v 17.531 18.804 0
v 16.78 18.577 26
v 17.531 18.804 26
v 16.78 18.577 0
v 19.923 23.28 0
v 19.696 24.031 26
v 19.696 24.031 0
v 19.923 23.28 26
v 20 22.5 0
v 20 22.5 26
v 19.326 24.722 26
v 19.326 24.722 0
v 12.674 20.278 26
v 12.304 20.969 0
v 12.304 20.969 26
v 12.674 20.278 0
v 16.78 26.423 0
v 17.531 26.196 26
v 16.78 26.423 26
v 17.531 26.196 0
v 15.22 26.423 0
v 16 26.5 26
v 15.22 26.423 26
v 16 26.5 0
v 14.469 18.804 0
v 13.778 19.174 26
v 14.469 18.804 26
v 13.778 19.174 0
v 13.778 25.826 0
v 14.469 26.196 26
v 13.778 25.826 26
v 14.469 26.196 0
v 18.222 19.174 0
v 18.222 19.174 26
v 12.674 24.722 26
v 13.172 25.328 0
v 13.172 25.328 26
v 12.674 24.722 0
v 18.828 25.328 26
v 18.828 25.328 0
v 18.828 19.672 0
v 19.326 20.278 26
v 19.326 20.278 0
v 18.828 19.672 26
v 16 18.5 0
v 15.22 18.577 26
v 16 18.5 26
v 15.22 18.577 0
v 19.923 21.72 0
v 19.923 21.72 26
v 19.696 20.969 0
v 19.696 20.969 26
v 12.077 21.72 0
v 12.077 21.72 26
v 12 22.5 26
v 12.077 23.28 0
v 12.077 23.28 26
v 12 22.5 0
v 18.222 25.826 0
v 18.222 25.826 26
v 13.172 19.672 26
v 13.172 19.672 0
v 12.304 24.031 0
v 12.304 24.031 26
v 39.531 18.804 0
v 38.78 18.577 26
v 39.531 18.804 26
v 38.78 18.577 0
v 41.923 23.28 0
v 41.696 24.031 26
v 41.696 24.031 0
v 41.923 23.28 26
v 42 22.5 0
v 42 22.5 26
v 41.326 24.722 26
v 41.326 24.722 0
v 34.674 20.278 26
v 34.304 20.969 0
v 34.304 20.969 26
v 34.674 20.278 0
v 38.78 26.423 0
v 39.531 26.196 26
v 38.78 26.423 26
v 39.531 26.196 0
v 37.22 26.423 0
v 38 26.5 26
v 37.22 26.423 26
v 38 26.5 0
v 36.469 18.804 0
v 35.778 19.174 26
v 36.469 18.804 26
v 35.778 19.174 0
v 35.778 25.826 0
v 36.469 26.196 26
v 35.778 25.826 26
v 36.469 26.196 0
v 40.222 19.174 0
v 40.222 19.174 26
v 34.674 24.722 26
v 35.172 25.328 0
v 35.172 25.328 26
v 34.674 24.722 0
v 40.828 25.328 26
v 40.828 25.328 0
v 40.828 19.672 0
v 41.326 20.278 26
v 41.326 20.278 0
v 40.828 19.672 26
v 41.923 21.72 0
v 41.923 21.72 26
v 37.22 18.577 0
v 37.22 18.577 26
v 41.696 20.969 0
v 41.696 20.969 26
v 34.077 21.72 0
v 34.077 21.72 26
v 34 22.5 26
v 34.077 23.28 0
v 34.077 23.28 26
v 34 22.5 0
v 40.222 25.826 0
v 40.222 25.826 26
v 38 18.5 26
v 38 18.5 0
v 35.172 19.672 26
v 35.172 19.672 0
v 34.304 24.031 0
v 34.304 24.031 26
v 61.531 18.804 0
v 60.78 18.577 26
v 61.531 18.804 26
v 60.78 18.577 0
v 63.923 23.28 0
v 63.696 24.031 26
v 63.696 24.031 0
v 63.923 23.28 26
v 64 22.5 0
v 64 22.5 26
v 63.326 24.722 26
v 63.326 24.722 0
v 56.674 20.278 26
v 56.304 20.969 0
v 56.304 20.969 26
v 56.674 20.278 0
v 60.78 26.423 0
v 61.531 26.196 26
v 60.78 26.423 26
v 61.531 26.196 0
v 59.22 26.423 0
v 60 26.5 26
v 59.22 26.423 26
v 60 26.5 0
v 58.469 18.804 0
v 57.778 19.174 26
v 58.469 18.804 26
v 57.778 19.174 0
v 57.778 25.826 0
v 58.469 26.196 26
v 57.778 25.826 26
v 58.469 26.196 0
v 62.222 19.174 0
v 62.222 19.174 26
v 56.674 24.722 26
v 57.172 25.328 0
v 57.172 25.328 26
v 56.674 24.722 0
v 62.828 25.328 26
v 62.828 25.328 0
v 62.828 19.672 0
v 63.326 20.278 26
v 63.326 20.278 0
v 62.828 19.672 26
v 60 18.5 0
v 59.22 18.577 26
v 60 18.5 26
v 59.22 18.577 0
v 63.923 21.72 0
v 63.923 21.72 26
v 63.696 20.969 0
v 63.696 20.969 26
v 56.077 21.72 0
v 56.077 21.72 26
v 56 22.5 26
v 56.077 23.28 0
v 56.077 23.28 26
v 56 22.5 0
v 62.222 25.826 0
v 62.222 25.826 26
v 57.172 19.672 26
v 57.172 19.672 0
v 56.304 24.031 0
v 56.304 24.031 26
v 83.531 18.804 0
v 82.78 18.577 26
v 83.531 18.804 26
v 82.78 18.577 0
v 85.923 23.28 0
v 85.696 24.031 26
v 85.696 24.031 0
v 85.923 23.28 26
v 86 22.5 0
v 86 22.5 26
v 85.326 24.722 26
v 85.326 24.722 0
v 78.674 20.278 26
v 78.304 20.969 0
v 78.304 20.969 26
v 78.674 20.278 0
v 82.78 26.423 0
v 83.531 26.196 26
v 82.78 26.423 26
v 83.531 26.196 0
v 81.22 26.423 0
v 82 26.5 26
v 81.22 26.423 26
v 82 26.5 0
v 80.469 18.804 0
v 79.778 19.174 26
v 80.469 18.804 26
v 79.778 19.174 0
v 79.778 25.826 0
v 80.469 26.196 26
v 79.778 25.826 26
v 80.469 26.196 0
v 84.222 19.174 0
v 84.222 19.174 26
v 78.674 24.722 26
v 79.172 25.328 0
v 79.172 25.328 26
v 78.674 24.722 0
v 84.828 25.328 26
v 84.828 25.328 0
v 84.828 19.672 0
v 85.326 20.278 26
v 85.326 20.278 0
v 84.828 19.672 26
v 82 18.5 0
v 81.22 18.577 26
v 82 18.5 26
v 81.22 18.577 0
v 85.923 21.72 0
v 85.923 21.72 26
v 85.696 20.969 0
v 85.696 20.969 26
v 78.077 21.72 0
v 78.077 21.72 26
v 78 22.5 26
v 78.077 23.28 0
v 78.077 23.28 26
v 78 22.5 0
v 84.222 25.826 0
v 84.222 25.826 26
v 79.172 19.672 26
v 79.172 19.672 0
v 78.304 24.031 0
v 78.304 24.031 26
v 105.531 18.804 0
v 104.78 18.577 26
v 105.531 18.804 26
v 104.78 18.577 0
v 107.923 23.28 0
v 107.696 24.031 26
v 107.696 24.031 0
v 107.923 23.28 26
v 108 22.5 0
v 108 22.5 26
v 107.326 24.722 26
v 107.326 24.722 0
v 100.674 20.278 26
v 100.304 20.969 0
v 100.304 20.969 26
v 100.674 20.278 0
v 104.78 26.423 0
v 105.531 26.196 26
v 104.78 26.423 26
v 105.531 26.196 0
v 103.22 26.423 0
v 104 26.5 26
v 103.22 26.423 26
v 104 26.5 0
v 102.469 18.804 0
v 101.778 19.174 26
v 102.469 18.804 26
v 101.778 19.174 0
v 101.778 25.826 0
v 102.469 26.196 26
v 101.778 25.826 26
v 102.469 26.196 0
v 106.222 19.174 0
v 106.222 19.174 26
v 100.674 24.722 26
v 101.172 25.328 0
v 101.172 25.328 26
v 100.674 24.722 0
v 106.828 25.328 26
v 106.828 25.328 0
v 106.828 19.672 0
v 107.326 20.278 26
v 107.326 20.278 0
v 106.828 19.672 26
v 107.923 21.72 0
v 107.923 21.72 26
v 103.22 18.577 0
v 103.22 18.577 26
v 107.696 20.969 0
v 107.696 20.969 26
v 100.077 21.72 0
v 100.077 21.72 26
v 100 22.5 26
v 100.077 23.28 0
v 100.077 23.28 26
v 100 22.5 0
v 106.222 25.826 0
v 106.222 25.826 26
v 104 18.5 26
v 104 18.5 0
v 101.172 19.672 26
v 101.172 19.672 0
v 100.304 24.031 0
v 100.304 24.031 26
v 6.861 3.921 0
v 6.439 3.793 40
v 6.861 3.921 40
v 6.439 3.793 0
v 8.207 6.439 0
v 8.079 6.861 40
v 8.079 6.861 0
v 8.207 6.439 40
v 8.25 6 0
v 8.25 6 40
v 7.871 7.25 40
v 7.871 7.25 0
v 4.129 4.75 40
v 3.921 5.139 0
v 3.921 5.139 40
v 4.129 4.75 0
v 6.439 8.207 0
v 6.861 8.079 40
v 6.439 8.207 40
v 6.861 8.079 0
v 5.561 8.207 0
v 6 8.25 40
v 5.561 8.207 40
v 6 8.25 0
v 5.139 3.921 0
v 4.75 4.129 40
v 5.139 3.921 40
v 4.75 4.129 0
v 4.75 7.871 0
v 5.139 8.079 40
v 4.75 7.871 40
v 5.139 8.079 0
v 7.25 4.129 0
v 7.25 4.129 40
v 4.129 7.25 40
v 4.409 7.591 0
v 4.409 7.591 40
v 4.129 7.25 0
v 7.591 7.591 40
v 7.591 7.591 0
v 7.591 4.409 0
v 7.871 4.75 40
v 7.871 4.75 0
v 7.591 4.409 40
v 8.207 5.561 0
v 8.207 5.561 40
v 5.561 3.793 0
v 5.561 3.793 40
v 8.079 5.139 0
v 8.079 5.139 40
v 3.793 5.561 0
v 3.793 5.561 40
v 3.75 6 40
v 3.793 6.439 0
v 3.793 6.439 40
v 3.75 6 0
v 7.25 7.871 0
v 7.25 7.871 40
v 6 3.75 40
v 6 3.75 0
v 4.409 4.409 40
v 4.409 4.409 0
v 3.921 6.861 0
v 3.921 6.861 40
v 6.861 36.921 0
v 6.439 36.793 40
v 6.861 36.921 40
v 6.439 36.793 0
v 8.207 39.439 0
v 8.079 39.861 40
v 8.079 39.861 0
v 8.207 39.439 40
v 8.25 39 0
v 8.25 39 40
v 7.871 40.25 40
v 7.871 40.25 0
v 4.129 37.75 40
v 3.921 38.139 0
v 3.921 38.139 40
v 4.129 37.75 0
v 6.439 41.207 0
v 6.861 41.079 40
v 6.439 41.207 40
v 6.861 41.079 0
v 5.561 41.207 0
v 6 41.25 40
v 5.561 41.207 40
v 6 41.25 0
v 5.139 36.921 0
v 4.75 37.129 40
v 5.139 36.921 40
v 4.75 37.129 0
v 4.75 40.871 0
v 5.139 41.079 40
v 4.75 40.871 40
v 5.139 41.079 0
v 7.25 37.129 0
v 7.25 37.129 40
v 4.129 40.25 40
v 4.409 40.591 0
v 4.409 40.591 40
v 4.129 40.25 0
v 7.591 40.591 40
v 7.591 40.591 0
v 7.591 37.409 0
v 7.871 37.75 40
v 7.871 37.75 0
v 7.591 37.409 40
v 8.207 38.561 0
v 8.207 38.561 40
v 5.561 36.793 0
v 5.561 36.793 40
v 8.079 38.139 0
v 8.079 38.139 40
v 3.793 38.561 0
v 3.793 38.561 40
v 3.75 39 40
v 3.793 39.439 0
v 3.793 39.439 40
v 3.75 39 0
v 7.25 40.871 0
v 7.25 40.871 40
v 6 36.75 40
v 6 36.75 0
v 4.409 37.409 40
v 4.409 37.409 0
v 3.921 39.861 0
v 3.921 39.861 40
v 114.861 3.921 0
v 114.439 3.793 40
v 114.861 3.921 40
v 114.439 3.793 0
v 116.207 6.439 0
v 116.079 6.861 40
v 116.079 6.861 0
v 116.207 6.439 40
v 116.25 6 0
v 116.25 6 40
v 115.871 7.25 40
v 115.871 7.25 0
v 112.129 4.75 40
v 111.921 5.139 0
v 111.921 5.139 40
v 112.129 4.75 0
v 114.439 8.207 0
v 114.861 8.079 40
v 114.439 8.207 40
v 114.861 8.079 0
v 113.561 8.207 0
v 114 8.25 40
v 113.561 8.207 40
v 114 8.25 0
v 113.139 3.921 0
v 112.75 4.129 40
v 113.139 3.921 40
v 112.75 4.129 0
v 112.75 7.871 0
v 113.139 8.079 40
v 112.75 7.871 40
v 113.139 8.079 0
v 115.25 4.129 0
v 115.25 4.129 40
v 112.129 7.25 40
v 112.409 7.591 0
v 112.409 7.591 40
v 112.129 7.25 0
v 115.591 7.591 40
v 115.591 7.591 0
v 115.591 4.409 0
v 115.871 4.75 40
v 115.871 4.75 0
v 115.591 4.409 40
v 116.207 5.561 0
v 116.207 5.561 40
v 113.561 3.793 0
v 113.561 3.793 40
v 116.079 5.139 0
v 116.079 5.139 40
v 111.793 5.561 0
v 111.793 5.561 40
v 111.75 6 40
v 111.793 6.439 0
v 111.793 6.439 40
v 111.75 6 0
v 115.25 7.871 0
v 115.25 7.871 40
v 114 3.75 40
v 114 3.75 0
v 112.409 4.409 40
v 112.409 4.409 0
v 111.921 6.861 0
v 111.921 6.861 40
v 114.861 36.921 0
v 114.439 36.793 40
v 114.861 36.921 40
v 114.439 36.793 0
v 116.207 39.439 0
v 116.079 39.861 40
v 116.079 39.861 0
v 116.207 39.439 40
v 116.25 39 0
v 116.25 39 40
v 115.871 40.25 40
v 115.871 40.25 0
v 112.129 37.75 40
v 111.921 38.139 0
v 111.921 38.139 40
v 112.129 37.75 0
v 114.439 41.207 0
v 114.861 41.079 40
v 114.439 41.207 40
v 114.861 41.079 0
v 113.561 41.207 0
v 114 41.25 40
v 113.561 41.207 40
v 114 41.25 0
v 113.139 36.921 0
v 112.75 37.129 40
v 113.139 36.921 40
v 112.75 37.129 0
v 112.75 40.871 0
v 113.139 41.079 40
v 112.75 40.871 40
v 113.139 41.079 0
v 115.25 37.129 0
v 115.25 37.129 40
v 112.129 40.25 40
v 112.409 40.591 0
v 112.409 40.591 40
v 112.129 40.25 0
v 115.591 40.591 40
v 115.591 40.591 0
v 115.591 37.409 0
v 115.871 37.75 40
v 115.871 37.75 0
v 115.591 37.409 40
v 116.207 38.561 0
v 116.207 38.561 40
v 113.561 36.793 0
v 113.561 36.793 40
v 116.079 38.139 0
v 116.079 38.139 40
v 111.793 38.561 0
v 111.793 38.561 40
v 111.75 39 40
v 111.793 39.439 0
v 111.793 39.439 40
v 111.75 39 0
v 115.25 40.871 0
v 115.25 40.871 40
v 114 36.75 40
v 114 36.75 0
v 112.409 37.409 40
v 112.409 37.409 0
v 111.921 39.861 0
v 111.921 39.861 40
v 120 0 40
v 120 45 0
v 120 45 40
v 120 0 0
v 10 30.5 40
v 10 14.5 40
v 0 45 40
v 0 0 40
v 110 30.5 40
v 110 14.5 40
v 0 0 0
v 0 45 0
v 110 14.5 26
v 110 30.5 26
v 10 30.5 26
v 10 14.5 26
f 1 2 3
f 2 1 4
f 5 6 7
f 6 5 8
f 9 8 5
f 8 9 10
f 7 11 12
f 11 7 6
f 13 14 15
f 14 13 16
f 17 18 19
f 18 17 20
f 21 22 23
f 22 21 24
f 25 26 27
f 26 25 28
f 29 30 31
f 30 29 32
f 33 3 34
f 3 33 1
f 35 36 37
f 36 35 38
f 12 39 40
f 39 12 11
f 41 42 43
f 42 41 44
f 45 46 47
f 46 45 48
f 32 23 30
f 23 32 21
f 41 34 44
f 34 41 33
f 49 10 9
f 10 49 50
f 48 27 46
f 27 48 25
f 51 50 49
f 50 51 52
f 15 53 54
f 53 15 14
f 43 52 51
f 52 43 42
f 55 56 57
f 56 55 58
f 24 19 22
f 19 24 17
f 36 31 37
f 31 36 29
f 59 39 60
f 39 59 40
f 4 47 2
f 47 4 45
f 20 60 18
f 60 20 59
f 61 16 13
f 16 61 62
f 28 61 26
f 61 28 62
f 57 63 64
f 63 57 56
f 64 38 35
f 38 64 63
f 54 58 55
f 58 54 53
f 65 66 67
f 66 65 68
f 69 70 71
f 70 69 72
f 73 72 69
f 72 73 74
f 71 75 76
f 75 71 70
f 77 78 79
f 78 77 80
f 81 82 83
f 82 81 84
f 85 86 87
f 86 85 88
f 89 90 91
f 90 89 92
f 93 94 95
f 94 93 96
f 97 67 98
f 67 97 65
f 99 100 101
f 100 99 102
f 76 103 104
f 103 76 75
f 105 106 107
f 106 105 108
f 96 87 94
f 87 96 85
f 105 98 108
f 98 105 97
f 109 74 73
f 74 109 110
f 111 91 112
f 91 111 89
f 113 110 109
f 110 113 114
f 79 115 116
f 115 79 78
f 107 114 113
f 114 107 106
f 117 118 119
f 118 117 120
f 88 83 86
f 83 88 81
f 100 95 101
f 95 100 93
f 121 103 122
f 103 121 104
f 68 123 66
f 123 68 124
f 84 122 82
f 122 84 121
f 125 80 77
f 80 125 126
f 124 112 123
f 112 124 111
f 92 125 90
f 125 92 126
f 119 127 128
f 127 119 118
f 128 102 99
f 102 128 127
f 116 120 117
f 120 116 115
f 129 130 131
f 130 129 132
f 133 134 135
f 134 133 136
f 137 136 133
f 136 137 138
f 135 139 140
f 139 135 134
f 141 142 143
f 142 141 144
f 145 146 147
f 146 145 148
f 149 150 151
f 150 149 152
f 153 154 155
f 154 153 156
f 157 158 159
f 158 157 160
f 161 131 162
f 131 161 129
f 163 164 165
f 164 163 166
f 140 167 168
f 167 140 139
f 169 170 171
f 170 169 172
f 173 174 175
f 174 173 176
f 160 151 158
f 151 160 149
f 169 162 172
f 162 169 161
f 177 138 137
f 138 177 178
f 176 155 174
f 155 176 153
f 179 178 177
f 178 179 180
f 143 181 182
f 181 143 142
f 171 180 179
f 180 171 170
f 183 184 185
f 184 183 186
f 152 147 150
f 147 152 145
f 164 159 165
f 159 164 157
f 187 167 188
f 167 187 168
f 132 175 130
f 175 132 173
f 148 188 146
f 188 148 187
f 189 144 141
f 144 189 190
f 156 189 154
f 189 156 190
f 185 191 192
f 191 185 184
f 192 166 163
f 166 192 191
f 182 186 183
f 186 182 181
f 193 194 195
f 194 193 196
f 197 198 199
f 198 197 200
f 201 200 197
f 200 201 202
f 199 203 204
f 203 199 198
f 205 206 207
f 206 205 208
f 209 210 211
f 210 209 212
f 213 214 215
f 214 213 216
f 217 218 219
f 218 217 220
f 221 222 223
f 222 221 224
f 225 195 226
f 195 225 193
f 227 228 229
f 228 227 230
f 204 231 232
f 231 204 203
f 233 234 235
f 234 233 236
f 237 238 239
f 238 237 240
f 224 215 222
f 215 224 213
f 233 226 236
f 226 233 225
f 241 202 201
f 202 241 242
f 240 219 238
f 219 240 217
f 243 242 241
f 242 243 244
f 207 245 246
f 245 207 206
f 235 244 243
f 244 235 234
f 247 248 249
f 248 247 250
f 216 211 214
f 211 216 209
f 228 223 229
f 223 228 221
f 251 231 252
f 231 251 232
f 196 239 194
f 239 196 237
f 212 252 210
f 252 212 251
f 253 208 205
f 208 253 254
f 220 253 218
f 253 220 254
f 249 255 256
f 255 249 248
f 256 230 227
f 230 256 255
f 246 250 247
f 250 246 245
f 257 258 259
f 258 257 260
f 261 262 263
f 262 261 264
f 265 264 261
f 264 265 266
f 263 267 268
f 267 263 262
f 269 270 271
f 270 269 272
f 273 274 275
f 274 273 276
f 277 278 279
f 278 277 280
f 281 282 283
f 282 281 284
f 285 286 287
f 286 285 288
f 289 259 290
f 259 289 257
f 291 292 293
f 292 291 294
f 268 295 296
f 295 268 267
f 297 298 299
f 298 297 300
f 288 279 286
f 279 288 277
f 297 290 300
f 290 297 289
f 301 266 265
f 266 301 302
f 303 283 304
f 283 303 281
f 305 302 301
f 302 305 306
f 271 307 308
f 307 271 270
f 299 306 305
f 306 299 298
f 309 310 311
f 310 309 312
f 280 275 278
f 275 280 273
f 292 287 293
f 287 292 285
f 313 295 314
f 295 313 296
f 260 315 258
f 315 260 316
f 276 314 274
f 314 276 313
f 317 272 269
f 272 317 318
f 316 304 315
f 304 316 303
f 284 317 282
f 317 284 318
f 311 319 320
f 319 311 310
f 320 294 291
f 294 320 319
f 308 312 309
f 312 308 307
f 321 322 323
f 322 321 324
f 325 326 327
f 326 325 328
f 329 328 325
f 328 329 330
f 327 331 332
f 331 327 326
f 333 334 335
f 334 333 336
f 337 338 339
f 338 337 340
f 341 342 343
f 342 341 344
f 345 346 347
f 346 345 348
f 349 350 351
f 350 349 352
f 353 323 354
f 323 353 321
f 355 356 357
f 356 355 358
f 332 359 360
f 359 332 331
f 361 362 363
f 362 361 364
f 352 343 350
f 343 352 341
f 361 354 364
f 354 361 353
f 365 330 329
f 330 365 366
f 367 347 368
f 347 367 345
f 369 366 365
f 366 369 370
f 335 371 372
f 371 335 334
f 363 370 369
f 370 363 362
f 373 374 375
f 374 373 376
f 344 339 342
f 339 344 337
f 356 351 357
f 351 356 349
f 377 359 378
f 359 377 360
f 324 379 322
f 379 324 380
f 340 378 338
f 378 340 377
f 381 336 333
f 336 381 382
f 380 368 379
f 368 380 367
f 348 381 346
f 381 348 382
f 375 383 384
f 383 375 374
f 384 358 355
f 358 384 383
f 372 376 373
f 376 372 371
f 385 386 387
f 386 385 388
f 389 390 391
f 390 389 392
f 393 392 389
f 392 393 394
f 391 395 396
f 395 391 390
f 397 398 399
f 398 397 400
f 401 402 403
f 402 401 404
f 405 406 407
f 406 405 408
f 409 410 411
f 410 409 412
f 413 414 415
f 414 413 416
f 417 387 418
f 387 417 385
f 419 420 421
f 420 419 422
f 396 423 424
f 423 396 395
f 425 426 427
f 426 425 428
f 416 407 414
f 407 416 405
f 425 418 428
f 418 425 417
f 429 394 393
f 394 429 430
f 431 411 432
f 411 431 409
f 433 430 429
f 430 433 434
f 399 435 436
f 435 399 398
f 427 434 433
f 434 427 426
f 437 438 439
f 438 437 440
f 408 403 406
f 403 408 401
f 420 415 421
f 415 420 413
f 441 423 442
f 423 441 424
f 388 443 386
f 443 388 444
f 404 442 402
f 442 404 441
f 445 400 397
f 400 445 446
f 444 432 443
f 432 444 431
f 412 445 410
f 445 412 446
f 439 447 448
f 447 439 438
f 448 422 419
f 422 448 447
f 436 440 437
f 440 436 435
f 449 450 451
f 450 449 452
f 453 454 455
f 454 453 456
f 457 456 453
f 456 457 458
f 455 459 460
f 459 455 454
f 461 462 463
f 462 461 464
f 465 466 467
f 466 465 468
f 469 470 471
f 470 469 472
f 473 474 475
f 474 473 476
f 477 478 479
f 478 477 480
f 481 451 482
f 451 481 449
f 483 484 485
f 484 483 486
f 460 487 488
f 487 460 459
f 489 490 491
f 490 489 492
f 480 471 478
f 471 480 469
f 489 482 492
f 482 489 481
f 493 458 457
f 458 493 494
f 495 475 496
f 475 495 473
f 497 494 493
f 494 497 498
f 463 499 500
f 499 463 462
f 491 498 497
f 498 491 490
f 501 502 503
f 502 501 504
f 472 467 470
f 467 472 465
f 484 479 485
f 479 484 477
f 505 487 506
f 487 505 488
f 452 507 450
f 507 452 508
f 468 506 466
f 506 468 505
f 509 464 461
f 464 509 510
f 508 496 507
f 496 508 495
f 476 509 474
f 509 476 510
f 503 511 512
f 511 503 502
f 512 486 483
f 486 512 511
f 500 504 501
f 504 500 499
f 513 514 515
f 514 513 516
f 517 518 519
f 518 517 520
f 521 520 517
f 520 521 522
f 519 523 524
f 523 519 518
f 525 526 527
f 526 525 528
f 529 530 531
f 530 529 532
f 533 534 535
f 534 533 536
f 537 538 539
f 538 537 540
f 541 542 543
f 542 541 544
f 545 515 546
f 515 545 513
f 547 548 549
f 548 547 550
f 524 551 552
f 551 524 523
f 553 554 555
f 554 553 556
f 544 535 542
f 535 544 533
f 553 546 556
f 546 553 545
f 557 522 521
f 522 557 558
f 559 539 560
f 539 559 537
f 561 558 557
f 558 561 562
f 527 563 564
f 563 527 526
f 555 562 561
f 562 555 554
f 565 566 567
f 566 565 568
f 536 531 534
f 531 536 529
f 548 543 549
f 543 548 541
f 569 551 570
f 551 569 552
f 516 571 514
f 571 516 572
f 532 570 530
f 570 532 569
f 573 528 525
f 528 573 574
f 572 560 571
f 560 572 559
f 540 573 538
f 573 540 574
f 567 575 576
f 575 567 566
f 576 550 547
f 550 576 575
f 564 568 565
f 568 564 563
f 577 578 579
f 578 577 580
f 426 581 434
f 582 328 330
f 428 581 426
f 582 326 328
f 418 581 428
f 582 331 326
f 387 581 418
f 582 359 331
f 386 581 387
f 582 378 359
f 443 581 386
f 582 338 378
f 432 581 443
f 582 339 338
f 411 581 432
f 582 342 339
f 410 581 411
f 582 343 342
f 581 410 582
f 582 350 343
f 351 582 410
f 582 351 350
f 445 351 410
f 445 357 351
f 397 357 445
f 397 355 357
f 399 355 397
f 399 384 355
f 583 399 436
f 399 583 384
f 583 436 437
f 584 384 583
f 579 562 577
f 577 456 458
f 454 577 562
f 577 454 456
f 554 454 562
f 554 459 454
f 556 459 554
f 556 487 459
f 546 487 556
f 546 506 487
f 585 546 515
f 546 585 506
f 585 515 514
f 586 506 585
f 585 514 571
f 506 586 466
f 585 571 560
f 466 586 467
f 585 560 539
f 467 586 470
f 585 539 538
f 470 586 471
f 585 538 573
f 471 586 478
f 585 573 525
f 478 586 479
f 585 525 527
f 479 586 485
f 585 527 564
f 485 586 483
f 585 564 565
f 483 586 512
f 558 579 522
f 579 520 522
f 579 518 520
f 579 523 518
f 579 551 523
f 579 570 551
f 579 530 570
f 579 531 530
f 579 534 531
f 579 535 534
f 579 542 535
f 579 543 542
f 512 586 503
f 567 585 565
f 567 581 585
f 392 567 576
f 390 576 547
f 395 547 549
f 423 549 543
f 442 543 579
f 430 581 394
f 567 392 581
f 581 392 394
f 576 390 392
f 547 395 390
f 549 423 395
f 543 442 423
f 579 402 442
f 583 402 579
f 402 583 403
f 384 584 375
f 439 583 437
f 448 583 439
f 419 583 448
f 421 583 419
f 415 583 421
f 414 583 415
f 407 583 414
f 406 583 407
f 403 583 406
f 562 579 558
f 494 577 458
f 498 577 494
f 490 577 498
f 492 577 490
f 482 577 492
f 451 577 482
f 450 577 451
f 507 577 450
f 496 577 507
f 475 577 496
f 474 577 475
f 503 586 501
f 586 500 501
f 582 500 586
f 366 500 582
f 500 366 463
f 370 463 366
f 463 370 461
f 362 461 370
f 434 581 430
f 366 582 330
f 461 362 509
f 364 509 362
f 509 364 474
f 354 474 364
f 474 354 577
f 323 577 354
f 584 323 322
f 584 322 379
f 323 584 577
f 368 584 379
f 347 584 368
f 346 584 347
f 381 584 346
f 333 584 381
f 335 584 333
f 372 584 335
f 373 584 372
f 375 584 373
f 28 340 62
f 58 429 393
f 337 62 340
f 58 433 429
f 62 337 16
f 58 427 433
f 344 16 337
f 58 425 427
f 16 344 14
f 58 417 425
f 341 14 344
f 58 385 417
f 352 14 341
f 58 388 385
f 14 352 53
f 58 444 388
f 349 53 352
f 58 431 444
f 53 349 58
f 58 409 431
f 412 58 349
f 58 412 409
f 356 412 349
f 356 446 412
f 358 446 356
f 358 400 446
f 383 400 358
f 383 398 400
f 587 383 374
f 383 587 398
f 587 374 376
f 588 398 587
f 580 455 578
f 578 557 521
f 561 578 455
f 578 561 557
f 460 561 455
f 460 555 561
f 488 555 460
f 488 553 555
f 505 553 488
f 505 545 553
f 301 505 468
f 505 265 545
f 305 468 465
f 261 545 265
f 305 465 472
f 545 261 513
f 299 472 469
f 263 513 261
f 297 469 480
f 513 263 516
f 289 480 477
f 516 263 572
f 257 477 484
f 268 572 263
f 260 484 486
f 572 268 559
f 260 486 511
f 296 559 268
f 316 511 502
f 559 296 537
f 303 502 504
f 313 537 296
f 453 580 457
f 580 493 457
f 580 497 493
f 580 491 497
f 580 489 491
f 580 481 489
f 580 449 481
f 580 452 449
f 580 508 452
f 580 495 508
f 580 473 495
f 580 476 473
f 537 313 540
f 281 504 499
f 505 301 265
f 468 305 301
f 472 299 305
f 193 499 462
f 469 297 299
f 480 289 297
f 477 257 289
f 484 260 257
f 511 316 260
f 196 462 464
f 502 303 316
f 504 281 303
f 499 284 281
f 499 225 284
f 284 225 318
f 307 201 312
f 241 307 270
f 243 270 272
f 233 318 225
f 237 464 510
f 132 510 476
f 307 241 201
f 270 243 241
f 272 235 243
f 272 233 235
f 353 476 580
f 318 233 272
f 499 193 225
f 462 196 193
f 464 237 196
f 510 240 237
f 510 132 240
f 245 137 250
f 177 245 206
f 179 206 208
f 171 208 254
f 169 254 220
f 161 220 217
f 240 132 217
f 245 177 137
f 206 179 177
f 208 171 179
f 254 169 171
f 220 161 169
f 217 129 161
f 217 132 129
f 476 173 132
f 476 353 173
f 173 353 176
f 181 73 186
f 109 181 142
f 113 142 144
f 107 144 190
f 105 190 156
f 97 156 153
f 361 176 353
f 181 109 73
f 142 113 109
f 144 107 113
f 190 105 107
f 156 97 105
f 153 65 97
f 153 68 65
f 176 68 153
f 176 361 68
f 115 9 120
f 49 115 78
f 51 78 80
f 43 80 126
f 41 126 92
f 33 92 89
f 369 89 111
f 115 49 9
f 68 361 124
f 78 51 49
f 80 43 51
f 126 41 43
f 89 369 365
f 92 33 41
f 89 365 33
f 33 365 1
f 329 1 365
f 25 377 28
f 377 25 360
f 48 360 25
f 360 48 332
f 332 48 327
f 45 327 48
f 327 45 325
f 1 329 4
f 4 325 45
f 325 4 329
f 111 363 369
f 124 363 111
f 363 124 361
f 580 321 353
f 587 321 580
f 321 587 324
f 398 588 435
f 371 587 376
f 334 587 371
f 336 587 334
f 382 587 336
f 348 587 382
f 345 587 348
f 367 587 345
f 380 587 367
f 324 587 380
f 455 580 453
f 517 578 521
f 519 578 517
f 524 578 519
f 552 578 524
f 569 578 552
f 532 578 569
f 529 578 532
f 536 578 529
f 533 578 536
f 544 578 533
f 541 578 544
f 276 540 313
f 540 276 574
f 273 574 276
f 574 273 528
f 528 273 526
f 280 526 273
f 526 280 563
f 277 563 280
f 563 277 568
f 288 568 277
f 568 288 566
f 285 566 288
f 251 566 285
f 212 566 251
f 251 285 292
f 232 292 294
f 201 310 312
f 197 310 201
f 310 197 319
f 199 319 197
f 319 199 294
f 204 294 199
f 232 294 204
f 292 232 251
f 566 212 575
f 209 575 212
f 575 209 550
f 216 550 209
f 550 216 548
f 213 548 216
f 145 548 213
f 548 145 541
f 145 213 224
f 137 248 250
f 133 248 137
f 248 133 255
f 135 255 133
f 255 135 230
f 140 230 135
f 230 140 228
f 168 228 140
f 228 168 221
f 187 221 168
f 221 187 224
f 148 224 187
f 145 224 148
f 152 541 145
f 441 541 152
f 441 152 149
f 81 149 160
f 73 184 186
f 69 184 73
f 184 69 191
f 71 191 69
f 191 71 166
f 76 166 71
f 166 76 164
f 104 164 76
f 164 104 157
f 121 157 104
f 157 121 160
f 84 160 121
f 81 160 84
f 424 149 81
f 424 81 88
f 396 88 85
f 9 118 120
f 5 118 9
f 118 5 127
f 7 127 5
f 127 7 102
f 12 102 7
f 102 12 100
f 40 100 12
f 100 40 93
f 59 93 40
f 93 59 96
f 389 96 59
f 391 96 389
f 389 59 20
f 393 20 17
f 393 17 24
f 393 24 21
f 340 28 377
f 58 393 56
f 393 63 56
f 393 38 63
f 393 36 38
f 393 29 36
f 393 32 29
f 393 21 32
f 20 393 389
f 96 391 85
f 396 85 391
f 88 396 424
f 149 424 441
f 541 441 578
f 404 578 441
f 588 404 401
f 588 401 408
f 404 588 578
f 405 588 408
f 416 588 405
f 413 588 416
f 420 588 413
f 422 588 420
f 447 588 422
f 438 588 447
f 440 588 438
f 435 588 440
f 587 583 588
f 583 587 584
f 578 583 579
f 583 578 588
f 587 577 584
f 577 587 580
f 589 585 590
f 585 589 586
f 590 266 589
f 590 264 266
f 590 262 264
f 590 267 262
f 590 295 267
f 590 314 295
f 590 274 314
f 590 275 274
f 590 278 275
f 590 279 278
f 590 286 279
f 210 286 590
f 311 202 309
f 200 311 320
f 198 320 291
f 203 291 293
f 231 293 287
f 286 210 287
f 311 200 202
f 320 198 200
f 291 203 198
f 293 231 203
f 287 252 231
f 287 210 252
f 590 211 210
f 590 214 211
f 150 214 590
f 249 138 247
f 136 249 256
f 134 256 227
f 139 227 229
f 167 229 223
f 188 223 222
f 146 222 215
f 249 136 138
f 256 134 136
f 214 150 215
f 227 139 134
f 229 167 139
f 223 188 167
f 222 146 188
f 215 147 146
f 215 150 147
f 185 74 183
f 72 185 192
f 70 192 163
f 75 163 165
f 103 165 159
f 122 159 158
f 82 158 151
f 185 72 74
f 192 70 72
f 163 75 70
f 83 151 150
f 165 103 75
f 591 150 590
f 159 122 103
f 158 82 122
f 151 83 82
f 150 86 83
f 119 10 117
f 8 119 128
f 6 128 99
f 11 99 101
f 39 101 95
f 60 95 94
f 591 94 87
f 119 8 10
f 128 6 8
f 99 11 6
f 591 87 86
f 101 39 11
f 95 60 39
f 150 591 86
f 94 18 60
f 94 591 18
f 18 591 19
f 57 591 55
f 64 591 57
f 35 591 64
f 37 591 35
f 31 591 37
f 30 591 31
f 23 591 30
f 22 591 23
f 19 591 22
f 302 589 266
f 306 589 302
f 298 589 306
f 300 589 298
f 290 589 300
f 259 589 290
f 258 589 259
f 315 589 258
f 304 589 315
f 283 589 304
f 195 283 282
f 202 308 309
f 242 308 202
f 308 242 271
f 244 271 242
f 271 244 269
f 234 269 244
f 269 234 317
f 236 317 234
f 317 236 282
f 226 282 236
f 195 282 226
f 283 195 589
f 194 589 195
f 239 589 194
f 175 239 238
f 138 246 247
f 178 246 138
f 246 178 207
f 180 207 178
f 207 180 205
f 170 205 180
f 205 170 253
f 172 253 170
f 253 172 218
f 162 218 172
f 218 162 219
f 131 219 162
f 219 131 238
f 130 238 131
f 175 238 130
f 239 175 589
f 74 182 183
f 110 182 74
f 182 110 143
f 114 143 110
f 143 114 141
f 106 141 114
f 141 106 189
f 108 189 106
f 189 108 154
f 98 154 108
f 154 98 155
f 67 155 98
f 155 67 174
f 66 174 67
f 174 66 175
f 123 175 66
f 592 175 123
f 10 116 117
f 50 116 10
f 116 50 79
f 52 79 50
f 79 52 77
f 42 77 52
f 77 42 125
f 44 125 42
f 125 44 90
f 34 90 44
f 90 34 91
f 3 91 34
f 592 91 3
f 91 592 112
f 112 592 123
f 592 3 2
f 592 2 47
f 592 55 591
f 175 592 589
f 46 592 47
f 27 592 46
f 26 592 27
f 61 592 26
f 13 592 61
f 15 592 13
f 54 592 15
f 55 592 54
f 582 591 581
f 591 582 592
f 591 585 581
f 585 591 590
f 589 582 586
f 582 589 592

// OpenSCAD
$fn = 32;

// ----------------------------------------------------------------------
// Manifold block: gallery_top manifold
// ----------------------------------------------------------------------

// --- parameters (mm) ---
block_l = 120;            // block length, X
block_w = 45;             // block width, Y
block_h = 40;             // block height, Z
port_d = 8;               // port bore diameter
port_pitch = 22;          // port pitch along X
gallery_d = 16;           // top gallery width, Y
gallery_depth = 14;       // gallery pocket depth
wall_p = 10;              // gallery end wall thickness, X
mnt_d = 4.5;              // mounting hole diameter
mnt_in = 6;               // mounting hole inset from the edges

n_ports = 5;  // ports in the row
port_x0 = (block_l - (n_ports - 1) * port_pitch) / 2;  // first port X

difference() {
  cube([block_l, block_w, block_h]);
  for (i = [0 : n_ports - 1])
    translate([port_x0 + i * port_pitch, block_w / 2, -1])
      cylinder(h = block_h + 2, d = port_d);
  translate([wall_p, block_w / 2 - gallery_d / 2, block_h - gallery_depth])
    cube([block_l - 2 * wall_p, gallery_d, gallery_depth + 1]);
  for (cx = [mnt_in, block_l - mnt_in])
    for (cy = [mnt_in, block_w - mnt_in])
      translate([cx, cy, -1]) cylinder(h = block_h + 2, d = mnt_d);
}
